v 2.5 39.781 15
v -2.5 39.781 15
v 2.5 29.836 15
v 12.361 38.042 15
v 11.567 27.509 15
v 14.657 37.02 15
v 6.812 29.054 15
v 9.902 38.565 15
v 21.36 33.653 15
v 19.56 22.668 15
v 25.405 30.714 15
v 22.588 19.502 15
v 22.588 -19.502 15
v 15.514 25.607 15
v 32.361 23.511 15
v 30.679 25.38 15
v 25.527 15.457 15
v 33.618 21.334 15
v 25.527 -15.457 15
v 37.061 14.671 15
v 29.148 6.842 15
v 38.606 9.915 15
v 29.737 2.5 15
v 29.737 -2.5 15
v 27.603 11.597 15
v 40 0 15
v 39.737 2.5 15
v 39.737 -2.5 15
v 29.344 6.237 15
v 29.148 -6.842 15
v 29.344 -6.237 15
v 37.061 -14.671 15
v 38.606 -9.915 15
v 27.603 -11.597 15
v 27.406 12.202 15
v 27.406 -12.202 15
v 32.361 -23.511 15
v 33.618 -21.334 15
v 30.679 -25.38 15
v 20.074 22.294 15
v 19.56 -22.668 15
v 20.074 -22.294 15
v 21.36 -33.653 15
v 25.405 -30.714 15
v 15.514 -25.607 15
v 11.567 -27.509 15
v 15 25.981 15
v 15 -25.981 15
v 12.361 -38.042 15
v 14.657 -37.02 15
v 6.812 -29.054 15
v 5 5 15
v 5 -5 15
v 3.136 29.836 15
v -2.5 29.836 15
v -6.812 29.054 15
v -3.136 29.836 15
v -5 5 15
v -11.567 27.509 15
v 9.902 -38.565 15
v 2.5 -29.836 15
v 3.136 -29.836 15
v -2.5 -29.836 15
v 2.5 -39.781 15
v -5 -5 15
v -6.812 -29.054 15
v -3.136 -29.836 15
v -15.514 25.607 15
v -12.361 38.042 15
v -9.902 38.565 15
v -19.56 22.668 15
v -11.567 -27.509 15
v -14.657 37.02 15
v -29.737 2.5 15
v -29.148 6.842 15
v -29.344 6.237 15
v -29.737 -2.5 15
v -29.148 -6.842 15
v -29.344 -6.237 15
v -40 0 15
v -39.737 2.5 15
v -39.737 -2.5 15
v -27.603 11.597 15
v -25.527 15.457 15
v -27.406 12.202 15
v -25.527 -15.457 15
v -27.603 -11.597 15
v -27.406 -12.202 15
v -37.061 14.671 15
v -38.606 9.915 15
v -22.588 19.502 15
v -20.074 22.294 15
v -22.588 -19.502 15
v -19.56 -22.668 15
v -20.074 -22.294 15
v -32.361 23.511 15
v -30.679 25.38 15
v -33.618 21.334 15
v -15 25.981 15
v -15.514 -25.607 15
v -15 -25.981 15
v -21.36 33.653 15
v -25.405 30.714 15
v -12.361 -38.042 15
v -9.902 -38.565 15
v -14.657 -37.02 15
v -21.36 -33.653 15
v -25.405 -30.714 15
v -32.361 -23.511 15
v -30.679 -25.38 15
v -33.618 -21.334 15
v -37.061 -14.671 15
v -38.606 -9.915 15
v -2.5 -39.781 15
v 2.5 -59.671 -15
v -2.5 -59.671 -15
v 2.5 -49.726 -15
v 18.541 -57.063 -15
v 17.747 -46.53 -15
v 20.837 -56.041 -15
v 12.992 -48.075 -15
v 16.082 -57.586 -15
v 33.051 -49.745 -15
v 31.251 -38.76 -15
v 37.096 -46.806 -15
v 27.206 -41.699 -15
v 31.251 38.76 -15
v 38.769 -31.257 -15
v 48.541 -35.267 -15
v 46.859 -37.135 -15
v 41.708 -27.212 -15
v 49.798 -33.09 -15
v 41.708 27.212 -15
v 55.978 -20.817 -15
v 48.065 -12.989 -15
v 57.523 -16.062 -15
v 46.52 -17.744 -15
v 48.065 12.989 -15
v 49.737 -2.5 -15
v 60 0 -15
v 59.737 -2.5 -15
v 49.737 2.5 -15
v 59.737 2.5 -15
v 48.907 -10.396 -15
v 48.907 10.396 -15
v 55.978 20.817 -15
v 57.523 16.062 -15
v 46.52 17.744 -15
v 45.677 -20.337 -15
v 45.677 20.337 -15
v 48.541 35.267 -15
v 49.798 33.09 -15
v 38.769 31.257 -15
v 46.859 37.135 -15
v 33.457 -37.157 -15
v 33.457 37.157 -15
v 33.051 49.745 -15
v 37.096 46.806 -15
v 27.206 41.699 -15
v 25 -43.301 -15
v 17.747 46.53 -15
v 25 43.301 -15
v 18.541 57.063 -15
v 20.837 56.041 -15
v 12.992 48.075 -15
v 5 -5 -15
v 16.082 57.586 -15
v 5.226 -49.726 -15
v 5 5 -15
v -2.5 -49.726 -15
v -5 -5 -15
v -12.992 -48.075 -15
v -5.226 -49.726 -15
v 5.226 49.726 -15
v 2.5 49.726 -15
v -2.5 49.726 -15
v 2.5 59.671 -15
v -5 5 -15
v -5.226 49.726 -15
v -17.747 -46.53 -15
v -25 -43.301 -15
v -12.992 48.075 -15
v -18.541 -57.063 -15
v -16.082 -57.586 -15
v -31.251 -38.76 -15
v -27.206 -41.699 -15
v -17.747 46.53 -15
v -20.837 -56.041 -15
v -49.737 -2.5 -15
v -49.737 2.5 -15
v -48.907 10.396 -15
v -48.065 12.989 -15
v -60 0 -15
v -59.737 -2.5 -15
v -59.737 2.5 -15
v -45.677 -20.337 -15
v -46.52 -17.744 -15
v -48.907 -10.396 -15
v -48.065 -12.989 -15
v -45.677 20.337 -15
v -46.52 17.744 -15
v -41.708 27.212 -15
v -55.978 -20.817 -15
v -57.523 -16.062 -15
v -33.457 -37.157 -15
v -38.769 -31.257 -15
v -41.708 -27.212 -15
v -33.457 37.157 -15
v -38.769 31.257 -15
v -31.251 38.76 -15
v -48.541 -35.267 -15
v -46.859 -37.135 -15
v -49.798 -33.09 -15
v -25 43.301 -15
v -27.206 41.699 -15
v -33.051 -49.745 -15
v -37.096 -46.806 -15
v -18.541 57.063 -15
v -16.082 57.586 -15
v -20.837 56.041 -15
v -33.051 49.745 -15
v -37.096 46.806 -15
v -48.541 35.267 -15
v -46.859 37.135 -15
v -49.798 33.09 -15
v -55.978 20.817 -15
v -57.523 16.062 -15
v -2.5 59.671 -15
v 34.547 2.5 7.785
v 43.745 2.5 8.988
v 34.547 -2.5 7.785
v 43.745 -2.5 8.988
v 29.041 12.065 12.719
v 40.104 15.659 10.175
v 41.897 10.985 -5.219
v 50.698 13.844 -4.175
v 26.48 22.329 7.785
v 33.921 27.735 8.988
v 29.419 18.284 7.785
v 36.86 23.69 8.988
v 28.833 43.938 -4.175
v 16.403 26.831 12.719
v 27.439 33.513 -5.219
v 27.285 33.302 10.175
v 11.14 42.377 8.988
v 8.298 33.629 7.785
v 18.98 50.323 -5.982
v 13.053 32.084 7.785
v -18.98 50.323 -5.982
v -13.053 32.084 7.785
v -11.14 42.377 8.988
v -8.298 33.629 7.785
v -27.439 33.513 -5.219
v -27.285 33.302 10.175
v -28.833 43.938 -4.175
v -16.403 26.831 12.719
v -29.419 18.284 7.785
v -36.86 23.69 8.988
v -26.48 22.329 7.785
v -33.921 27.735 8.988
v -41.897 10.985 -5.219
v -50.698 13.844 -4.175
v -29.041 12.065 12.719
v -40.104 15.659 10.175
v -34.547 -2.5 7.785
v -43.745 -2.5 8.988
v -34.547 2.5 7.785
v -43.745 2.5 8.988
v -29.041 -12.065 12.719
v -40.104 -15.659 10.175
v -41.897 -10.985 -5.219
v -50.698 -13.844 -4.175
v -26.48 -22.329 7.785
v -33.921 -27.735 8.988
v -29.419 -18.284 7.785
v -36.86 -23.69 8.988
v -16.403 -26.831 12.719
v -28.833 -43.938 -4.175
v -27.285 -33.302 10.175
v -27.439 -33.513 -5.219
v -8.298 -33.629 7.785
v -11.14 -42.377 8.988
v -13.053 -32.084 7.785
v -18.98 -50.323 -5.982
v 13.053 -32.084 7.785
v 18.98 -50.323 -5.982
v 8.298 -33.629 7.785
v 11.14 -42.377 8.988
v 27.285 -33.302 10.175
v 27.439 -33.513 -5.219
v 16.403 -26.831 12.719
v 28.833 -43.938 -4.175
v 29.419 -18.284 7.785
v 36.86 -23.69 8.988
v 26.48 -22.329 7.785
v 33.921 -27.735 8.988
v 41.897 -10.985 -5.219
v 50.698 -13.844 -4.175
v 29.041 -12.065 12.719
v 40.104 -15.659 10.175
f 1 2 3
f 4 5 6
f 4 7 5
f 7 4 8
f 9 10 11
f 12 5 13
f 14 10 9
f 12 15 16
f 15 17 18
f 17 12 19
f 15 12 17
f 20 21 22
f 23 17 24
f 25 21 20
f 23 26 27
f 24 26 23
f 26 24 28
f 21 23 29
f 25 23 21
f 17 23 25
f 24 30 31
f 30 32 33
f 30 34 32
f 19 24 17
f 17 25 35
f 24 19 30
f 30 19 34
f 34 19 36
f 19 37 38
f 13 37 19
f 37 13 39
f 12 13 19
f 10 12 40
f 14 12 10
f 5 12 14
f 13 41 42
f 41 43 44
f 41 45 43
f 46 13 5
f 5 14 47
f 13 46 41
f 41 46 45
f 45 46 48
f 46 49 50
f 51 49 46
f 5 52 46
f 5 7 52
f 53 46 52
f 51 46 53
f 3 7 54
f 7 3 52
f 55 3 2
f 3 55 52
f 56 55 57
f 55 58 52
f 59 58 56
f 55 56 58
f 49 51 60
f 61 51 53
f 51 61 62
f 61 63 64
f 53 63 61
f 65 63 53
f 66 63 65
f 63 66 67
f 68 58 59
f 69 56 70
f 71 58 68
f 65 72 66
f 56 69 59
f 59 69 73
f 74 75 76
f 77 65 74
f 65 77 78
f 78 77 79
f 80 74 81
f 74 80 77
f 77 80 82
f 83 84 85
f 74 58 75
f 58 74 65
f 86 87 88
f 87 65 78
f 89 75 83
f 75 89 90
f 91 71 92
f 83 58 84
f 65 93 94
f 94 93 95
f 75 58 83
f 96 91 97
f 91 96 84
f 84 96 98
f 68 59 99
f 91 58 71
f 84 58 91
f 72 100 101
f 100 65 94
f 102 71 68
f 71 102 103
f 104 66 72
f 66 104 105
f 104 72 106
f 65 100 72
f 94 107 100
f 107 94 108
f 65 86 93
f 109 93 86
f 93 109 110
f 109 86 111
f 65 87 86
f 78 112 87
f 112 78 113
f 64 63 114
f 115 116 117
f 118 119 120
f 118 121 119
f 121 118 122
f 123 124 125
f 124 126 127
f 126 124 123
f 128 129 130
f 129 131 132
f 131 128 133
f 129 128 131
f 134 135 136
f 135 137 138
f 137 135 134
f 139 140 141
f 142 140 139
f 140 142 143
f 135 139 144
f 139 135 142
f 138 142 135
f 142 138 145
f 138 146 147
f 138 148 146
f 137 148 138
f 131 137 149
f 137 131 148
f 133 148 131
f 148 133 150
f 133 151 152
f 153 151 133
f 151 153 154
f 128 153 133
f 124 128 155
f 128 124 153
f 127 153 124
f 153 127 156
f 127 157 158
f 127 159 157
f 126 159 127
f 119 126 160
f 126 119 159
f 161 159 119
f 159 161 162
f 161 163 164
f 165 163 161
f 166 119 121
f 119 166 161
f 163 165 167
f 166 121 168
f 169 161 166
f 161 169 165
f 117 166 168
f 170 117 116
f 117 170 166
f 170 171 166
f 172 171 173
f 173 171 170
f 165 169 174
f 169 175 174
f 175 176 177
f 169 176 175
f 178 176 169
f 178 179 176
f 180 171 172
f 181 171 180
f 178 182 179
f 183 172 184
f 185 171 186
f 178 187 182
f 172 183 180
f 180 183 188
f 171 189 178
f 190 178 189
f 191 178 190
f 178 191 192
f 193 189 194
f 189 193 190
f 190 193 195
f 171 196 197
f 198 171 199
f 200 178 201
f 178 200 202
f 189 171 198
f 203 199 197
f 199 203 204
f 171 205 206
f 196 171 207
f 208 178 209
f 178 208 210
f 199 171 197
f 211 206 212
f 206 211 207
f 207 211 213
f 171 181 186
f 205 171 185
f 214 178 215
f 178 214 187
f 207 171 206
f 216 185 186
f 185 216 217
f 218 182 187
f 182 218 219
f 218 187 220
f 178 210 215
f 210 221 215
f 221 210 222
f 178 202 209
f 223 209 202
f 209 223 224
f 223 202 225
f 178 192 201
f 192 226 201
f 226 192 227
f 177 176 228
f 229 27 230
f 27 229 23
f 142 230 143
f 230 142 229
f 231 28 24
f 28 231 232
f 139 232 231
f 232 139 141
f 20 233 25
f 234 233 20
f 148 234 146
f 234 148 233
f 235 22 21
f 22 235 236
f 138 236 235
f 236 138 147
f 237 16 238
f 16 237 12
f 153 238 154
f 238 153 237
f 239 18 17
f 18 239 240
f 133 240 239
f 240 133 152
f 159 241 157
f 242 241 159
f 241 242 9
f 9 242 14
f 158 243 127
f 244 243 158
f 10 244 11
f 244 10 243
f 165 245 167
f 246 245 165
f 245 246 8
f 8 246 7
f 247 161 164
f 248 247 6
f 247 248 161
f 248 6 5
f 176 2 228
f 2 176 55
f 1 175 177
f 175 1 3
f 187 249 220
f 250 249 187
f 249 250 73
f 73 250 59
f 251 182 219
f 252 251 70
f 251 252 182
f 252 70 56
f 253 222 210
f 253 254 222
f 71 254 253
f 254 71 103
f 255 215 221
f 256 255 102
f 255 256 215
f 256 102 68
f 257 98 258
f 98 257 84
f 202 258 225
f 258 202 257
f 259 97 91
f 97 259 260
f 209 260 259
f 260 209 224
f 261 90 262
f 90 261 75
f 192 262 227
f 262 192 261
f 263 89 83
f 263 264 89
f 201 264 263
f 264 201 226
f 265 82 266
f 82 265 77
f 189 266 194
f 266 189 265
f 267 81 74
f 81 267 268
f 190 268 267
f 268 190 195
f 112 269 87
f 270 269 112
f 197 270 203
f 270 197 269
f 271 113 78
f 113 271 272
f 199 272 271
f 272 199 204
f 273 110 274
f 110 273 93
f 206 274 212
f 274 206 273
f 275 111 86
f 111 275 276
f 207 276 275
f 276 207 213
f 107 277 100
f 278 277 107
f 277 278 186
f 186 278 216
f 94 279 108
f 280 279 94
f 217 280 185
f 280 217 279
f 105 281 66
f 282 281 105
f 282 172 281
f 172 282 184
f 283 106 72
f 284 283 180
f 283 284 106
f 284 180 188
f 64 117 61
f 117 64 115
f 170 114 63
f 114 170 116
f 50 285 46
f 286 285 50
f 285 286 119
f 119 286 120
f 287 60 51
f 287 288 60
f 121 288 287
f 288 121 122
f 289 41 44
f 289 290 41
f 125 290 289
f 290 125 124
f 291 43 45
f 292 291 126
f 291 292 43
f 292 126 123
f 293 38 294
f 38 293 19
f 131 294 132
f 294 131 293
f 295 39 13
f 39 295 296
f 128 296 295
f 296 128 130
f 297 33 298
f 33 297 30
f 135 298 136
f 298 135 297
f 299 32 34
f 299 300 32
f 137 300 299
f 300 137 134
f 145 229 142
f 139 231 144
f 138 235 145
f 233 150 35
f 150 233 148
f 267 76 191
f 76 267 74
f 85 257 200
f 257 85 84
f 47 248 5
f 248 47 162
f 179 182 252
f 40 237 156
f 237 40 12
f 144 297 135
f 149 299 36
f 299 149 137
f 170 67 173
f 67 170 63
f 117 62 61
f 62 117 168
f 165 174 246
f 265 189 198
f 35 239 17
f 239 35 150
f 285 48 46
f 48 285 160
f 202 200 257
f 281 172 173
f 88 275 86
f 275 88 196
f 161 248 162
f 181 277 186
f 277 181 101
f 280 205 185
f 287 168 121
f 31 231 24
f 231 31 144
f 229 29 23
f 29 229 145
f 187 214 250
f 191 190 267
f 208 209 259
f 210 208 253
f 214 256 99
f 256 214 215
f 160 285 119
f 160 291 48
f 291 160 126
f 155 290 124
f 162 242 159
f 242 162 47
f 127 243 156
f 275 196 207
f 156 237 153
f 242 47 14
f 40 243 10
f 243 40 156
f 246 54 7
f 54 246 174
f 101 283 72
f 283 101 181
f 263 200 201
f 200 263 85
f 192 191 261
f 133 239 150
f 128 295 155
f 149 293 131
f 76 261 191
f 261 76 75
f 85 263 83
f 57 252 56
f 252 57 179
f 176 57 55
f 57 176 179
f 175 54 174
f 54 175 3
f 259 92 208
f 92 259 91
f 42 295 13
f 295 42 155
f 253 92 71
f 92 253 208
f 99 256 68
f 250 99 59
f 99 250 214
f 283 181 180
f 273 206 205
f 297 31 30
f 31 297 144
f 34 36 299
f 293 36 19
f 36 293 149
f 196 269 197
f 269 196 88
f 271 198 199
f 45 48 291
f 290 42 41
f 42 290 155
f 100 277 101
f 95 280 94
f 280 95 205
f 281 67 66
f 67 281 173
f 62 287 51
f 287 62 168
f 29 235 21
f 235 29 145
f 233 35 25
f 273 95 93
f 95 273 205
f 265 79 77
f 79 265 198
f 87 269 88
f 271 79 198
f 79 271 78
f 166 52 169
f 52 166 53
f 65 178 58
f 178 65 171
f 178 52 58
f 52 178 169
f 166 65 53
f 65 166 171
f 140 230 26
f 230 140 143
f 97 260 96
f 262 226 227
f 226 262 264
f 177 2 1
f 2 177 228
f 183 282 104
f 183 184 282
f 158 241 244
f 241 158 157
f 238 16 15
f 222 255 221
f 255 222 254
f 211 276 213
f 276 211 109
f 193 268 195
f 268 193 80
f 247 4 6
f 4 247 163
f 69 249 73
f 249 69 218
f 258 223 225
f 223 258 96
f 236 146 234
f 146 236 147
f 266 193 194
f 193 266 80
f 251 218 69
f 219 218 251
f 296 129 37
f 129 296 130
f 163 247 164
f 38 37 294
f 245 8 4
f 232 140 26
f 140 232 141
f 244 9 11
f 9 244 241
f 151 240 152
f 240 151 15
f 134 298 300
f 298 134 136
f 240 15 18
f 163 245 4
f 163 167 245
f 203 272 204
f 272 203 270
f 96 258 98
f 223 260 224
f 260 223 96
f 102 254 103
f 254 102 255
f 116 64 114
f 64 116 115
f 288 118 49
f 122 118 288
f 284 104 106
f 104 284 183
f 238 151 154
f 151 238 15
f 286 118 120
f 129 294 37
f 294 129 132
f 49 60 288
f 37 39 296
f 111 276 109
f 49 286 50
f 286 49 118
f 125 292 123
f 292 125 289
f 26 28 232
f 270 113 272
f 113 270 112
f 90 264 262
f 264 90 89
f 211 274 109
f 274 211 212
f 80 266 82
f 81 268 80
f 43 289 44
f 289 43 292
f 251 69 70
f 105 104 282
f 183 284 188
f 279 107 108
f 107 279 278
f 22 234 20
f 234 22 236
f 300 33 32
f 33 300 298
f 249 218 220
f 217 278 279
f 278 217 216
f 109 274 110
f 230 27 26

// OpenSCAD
module gear(
    r1          = 50,
    r2          = 40,
    h           = 10,
    pocet_zubu  = 20,
    sirka_zubu  = 5,
    delka_zubu  = 10,
    hridel      = 10,
    oriznuty    = true
)  {
    zub = r1 + delka_zubu;

    intersection() {
        difference() {
            union() {
                cylinder( r1=r1, r2=r2, h=h, center=true );

                for( i=[0:pocet_zubu-1] ) {
                    rotate([ 0, 0, i*360/pocet_zubu ])
                        translate([zub/2, 0, 0 ])
                            cube( [ zub, sirka_zubu, h ], center=true );
                }
            }

            cube( [ hridel, hridel, h*2 ], center=true );
        }
        if ( oriznuty ) 
            cylinder( r1=r1+delka_zubu, r2=r2+delka_zubu, h=h, center=true );
    }
}

//gear( r1 = 100, r2 = 50, h = 100, delka_zubu = 5, pocet_zubu = 10 );
gear( r1 = 50, r2 = 30, h = 30  );
